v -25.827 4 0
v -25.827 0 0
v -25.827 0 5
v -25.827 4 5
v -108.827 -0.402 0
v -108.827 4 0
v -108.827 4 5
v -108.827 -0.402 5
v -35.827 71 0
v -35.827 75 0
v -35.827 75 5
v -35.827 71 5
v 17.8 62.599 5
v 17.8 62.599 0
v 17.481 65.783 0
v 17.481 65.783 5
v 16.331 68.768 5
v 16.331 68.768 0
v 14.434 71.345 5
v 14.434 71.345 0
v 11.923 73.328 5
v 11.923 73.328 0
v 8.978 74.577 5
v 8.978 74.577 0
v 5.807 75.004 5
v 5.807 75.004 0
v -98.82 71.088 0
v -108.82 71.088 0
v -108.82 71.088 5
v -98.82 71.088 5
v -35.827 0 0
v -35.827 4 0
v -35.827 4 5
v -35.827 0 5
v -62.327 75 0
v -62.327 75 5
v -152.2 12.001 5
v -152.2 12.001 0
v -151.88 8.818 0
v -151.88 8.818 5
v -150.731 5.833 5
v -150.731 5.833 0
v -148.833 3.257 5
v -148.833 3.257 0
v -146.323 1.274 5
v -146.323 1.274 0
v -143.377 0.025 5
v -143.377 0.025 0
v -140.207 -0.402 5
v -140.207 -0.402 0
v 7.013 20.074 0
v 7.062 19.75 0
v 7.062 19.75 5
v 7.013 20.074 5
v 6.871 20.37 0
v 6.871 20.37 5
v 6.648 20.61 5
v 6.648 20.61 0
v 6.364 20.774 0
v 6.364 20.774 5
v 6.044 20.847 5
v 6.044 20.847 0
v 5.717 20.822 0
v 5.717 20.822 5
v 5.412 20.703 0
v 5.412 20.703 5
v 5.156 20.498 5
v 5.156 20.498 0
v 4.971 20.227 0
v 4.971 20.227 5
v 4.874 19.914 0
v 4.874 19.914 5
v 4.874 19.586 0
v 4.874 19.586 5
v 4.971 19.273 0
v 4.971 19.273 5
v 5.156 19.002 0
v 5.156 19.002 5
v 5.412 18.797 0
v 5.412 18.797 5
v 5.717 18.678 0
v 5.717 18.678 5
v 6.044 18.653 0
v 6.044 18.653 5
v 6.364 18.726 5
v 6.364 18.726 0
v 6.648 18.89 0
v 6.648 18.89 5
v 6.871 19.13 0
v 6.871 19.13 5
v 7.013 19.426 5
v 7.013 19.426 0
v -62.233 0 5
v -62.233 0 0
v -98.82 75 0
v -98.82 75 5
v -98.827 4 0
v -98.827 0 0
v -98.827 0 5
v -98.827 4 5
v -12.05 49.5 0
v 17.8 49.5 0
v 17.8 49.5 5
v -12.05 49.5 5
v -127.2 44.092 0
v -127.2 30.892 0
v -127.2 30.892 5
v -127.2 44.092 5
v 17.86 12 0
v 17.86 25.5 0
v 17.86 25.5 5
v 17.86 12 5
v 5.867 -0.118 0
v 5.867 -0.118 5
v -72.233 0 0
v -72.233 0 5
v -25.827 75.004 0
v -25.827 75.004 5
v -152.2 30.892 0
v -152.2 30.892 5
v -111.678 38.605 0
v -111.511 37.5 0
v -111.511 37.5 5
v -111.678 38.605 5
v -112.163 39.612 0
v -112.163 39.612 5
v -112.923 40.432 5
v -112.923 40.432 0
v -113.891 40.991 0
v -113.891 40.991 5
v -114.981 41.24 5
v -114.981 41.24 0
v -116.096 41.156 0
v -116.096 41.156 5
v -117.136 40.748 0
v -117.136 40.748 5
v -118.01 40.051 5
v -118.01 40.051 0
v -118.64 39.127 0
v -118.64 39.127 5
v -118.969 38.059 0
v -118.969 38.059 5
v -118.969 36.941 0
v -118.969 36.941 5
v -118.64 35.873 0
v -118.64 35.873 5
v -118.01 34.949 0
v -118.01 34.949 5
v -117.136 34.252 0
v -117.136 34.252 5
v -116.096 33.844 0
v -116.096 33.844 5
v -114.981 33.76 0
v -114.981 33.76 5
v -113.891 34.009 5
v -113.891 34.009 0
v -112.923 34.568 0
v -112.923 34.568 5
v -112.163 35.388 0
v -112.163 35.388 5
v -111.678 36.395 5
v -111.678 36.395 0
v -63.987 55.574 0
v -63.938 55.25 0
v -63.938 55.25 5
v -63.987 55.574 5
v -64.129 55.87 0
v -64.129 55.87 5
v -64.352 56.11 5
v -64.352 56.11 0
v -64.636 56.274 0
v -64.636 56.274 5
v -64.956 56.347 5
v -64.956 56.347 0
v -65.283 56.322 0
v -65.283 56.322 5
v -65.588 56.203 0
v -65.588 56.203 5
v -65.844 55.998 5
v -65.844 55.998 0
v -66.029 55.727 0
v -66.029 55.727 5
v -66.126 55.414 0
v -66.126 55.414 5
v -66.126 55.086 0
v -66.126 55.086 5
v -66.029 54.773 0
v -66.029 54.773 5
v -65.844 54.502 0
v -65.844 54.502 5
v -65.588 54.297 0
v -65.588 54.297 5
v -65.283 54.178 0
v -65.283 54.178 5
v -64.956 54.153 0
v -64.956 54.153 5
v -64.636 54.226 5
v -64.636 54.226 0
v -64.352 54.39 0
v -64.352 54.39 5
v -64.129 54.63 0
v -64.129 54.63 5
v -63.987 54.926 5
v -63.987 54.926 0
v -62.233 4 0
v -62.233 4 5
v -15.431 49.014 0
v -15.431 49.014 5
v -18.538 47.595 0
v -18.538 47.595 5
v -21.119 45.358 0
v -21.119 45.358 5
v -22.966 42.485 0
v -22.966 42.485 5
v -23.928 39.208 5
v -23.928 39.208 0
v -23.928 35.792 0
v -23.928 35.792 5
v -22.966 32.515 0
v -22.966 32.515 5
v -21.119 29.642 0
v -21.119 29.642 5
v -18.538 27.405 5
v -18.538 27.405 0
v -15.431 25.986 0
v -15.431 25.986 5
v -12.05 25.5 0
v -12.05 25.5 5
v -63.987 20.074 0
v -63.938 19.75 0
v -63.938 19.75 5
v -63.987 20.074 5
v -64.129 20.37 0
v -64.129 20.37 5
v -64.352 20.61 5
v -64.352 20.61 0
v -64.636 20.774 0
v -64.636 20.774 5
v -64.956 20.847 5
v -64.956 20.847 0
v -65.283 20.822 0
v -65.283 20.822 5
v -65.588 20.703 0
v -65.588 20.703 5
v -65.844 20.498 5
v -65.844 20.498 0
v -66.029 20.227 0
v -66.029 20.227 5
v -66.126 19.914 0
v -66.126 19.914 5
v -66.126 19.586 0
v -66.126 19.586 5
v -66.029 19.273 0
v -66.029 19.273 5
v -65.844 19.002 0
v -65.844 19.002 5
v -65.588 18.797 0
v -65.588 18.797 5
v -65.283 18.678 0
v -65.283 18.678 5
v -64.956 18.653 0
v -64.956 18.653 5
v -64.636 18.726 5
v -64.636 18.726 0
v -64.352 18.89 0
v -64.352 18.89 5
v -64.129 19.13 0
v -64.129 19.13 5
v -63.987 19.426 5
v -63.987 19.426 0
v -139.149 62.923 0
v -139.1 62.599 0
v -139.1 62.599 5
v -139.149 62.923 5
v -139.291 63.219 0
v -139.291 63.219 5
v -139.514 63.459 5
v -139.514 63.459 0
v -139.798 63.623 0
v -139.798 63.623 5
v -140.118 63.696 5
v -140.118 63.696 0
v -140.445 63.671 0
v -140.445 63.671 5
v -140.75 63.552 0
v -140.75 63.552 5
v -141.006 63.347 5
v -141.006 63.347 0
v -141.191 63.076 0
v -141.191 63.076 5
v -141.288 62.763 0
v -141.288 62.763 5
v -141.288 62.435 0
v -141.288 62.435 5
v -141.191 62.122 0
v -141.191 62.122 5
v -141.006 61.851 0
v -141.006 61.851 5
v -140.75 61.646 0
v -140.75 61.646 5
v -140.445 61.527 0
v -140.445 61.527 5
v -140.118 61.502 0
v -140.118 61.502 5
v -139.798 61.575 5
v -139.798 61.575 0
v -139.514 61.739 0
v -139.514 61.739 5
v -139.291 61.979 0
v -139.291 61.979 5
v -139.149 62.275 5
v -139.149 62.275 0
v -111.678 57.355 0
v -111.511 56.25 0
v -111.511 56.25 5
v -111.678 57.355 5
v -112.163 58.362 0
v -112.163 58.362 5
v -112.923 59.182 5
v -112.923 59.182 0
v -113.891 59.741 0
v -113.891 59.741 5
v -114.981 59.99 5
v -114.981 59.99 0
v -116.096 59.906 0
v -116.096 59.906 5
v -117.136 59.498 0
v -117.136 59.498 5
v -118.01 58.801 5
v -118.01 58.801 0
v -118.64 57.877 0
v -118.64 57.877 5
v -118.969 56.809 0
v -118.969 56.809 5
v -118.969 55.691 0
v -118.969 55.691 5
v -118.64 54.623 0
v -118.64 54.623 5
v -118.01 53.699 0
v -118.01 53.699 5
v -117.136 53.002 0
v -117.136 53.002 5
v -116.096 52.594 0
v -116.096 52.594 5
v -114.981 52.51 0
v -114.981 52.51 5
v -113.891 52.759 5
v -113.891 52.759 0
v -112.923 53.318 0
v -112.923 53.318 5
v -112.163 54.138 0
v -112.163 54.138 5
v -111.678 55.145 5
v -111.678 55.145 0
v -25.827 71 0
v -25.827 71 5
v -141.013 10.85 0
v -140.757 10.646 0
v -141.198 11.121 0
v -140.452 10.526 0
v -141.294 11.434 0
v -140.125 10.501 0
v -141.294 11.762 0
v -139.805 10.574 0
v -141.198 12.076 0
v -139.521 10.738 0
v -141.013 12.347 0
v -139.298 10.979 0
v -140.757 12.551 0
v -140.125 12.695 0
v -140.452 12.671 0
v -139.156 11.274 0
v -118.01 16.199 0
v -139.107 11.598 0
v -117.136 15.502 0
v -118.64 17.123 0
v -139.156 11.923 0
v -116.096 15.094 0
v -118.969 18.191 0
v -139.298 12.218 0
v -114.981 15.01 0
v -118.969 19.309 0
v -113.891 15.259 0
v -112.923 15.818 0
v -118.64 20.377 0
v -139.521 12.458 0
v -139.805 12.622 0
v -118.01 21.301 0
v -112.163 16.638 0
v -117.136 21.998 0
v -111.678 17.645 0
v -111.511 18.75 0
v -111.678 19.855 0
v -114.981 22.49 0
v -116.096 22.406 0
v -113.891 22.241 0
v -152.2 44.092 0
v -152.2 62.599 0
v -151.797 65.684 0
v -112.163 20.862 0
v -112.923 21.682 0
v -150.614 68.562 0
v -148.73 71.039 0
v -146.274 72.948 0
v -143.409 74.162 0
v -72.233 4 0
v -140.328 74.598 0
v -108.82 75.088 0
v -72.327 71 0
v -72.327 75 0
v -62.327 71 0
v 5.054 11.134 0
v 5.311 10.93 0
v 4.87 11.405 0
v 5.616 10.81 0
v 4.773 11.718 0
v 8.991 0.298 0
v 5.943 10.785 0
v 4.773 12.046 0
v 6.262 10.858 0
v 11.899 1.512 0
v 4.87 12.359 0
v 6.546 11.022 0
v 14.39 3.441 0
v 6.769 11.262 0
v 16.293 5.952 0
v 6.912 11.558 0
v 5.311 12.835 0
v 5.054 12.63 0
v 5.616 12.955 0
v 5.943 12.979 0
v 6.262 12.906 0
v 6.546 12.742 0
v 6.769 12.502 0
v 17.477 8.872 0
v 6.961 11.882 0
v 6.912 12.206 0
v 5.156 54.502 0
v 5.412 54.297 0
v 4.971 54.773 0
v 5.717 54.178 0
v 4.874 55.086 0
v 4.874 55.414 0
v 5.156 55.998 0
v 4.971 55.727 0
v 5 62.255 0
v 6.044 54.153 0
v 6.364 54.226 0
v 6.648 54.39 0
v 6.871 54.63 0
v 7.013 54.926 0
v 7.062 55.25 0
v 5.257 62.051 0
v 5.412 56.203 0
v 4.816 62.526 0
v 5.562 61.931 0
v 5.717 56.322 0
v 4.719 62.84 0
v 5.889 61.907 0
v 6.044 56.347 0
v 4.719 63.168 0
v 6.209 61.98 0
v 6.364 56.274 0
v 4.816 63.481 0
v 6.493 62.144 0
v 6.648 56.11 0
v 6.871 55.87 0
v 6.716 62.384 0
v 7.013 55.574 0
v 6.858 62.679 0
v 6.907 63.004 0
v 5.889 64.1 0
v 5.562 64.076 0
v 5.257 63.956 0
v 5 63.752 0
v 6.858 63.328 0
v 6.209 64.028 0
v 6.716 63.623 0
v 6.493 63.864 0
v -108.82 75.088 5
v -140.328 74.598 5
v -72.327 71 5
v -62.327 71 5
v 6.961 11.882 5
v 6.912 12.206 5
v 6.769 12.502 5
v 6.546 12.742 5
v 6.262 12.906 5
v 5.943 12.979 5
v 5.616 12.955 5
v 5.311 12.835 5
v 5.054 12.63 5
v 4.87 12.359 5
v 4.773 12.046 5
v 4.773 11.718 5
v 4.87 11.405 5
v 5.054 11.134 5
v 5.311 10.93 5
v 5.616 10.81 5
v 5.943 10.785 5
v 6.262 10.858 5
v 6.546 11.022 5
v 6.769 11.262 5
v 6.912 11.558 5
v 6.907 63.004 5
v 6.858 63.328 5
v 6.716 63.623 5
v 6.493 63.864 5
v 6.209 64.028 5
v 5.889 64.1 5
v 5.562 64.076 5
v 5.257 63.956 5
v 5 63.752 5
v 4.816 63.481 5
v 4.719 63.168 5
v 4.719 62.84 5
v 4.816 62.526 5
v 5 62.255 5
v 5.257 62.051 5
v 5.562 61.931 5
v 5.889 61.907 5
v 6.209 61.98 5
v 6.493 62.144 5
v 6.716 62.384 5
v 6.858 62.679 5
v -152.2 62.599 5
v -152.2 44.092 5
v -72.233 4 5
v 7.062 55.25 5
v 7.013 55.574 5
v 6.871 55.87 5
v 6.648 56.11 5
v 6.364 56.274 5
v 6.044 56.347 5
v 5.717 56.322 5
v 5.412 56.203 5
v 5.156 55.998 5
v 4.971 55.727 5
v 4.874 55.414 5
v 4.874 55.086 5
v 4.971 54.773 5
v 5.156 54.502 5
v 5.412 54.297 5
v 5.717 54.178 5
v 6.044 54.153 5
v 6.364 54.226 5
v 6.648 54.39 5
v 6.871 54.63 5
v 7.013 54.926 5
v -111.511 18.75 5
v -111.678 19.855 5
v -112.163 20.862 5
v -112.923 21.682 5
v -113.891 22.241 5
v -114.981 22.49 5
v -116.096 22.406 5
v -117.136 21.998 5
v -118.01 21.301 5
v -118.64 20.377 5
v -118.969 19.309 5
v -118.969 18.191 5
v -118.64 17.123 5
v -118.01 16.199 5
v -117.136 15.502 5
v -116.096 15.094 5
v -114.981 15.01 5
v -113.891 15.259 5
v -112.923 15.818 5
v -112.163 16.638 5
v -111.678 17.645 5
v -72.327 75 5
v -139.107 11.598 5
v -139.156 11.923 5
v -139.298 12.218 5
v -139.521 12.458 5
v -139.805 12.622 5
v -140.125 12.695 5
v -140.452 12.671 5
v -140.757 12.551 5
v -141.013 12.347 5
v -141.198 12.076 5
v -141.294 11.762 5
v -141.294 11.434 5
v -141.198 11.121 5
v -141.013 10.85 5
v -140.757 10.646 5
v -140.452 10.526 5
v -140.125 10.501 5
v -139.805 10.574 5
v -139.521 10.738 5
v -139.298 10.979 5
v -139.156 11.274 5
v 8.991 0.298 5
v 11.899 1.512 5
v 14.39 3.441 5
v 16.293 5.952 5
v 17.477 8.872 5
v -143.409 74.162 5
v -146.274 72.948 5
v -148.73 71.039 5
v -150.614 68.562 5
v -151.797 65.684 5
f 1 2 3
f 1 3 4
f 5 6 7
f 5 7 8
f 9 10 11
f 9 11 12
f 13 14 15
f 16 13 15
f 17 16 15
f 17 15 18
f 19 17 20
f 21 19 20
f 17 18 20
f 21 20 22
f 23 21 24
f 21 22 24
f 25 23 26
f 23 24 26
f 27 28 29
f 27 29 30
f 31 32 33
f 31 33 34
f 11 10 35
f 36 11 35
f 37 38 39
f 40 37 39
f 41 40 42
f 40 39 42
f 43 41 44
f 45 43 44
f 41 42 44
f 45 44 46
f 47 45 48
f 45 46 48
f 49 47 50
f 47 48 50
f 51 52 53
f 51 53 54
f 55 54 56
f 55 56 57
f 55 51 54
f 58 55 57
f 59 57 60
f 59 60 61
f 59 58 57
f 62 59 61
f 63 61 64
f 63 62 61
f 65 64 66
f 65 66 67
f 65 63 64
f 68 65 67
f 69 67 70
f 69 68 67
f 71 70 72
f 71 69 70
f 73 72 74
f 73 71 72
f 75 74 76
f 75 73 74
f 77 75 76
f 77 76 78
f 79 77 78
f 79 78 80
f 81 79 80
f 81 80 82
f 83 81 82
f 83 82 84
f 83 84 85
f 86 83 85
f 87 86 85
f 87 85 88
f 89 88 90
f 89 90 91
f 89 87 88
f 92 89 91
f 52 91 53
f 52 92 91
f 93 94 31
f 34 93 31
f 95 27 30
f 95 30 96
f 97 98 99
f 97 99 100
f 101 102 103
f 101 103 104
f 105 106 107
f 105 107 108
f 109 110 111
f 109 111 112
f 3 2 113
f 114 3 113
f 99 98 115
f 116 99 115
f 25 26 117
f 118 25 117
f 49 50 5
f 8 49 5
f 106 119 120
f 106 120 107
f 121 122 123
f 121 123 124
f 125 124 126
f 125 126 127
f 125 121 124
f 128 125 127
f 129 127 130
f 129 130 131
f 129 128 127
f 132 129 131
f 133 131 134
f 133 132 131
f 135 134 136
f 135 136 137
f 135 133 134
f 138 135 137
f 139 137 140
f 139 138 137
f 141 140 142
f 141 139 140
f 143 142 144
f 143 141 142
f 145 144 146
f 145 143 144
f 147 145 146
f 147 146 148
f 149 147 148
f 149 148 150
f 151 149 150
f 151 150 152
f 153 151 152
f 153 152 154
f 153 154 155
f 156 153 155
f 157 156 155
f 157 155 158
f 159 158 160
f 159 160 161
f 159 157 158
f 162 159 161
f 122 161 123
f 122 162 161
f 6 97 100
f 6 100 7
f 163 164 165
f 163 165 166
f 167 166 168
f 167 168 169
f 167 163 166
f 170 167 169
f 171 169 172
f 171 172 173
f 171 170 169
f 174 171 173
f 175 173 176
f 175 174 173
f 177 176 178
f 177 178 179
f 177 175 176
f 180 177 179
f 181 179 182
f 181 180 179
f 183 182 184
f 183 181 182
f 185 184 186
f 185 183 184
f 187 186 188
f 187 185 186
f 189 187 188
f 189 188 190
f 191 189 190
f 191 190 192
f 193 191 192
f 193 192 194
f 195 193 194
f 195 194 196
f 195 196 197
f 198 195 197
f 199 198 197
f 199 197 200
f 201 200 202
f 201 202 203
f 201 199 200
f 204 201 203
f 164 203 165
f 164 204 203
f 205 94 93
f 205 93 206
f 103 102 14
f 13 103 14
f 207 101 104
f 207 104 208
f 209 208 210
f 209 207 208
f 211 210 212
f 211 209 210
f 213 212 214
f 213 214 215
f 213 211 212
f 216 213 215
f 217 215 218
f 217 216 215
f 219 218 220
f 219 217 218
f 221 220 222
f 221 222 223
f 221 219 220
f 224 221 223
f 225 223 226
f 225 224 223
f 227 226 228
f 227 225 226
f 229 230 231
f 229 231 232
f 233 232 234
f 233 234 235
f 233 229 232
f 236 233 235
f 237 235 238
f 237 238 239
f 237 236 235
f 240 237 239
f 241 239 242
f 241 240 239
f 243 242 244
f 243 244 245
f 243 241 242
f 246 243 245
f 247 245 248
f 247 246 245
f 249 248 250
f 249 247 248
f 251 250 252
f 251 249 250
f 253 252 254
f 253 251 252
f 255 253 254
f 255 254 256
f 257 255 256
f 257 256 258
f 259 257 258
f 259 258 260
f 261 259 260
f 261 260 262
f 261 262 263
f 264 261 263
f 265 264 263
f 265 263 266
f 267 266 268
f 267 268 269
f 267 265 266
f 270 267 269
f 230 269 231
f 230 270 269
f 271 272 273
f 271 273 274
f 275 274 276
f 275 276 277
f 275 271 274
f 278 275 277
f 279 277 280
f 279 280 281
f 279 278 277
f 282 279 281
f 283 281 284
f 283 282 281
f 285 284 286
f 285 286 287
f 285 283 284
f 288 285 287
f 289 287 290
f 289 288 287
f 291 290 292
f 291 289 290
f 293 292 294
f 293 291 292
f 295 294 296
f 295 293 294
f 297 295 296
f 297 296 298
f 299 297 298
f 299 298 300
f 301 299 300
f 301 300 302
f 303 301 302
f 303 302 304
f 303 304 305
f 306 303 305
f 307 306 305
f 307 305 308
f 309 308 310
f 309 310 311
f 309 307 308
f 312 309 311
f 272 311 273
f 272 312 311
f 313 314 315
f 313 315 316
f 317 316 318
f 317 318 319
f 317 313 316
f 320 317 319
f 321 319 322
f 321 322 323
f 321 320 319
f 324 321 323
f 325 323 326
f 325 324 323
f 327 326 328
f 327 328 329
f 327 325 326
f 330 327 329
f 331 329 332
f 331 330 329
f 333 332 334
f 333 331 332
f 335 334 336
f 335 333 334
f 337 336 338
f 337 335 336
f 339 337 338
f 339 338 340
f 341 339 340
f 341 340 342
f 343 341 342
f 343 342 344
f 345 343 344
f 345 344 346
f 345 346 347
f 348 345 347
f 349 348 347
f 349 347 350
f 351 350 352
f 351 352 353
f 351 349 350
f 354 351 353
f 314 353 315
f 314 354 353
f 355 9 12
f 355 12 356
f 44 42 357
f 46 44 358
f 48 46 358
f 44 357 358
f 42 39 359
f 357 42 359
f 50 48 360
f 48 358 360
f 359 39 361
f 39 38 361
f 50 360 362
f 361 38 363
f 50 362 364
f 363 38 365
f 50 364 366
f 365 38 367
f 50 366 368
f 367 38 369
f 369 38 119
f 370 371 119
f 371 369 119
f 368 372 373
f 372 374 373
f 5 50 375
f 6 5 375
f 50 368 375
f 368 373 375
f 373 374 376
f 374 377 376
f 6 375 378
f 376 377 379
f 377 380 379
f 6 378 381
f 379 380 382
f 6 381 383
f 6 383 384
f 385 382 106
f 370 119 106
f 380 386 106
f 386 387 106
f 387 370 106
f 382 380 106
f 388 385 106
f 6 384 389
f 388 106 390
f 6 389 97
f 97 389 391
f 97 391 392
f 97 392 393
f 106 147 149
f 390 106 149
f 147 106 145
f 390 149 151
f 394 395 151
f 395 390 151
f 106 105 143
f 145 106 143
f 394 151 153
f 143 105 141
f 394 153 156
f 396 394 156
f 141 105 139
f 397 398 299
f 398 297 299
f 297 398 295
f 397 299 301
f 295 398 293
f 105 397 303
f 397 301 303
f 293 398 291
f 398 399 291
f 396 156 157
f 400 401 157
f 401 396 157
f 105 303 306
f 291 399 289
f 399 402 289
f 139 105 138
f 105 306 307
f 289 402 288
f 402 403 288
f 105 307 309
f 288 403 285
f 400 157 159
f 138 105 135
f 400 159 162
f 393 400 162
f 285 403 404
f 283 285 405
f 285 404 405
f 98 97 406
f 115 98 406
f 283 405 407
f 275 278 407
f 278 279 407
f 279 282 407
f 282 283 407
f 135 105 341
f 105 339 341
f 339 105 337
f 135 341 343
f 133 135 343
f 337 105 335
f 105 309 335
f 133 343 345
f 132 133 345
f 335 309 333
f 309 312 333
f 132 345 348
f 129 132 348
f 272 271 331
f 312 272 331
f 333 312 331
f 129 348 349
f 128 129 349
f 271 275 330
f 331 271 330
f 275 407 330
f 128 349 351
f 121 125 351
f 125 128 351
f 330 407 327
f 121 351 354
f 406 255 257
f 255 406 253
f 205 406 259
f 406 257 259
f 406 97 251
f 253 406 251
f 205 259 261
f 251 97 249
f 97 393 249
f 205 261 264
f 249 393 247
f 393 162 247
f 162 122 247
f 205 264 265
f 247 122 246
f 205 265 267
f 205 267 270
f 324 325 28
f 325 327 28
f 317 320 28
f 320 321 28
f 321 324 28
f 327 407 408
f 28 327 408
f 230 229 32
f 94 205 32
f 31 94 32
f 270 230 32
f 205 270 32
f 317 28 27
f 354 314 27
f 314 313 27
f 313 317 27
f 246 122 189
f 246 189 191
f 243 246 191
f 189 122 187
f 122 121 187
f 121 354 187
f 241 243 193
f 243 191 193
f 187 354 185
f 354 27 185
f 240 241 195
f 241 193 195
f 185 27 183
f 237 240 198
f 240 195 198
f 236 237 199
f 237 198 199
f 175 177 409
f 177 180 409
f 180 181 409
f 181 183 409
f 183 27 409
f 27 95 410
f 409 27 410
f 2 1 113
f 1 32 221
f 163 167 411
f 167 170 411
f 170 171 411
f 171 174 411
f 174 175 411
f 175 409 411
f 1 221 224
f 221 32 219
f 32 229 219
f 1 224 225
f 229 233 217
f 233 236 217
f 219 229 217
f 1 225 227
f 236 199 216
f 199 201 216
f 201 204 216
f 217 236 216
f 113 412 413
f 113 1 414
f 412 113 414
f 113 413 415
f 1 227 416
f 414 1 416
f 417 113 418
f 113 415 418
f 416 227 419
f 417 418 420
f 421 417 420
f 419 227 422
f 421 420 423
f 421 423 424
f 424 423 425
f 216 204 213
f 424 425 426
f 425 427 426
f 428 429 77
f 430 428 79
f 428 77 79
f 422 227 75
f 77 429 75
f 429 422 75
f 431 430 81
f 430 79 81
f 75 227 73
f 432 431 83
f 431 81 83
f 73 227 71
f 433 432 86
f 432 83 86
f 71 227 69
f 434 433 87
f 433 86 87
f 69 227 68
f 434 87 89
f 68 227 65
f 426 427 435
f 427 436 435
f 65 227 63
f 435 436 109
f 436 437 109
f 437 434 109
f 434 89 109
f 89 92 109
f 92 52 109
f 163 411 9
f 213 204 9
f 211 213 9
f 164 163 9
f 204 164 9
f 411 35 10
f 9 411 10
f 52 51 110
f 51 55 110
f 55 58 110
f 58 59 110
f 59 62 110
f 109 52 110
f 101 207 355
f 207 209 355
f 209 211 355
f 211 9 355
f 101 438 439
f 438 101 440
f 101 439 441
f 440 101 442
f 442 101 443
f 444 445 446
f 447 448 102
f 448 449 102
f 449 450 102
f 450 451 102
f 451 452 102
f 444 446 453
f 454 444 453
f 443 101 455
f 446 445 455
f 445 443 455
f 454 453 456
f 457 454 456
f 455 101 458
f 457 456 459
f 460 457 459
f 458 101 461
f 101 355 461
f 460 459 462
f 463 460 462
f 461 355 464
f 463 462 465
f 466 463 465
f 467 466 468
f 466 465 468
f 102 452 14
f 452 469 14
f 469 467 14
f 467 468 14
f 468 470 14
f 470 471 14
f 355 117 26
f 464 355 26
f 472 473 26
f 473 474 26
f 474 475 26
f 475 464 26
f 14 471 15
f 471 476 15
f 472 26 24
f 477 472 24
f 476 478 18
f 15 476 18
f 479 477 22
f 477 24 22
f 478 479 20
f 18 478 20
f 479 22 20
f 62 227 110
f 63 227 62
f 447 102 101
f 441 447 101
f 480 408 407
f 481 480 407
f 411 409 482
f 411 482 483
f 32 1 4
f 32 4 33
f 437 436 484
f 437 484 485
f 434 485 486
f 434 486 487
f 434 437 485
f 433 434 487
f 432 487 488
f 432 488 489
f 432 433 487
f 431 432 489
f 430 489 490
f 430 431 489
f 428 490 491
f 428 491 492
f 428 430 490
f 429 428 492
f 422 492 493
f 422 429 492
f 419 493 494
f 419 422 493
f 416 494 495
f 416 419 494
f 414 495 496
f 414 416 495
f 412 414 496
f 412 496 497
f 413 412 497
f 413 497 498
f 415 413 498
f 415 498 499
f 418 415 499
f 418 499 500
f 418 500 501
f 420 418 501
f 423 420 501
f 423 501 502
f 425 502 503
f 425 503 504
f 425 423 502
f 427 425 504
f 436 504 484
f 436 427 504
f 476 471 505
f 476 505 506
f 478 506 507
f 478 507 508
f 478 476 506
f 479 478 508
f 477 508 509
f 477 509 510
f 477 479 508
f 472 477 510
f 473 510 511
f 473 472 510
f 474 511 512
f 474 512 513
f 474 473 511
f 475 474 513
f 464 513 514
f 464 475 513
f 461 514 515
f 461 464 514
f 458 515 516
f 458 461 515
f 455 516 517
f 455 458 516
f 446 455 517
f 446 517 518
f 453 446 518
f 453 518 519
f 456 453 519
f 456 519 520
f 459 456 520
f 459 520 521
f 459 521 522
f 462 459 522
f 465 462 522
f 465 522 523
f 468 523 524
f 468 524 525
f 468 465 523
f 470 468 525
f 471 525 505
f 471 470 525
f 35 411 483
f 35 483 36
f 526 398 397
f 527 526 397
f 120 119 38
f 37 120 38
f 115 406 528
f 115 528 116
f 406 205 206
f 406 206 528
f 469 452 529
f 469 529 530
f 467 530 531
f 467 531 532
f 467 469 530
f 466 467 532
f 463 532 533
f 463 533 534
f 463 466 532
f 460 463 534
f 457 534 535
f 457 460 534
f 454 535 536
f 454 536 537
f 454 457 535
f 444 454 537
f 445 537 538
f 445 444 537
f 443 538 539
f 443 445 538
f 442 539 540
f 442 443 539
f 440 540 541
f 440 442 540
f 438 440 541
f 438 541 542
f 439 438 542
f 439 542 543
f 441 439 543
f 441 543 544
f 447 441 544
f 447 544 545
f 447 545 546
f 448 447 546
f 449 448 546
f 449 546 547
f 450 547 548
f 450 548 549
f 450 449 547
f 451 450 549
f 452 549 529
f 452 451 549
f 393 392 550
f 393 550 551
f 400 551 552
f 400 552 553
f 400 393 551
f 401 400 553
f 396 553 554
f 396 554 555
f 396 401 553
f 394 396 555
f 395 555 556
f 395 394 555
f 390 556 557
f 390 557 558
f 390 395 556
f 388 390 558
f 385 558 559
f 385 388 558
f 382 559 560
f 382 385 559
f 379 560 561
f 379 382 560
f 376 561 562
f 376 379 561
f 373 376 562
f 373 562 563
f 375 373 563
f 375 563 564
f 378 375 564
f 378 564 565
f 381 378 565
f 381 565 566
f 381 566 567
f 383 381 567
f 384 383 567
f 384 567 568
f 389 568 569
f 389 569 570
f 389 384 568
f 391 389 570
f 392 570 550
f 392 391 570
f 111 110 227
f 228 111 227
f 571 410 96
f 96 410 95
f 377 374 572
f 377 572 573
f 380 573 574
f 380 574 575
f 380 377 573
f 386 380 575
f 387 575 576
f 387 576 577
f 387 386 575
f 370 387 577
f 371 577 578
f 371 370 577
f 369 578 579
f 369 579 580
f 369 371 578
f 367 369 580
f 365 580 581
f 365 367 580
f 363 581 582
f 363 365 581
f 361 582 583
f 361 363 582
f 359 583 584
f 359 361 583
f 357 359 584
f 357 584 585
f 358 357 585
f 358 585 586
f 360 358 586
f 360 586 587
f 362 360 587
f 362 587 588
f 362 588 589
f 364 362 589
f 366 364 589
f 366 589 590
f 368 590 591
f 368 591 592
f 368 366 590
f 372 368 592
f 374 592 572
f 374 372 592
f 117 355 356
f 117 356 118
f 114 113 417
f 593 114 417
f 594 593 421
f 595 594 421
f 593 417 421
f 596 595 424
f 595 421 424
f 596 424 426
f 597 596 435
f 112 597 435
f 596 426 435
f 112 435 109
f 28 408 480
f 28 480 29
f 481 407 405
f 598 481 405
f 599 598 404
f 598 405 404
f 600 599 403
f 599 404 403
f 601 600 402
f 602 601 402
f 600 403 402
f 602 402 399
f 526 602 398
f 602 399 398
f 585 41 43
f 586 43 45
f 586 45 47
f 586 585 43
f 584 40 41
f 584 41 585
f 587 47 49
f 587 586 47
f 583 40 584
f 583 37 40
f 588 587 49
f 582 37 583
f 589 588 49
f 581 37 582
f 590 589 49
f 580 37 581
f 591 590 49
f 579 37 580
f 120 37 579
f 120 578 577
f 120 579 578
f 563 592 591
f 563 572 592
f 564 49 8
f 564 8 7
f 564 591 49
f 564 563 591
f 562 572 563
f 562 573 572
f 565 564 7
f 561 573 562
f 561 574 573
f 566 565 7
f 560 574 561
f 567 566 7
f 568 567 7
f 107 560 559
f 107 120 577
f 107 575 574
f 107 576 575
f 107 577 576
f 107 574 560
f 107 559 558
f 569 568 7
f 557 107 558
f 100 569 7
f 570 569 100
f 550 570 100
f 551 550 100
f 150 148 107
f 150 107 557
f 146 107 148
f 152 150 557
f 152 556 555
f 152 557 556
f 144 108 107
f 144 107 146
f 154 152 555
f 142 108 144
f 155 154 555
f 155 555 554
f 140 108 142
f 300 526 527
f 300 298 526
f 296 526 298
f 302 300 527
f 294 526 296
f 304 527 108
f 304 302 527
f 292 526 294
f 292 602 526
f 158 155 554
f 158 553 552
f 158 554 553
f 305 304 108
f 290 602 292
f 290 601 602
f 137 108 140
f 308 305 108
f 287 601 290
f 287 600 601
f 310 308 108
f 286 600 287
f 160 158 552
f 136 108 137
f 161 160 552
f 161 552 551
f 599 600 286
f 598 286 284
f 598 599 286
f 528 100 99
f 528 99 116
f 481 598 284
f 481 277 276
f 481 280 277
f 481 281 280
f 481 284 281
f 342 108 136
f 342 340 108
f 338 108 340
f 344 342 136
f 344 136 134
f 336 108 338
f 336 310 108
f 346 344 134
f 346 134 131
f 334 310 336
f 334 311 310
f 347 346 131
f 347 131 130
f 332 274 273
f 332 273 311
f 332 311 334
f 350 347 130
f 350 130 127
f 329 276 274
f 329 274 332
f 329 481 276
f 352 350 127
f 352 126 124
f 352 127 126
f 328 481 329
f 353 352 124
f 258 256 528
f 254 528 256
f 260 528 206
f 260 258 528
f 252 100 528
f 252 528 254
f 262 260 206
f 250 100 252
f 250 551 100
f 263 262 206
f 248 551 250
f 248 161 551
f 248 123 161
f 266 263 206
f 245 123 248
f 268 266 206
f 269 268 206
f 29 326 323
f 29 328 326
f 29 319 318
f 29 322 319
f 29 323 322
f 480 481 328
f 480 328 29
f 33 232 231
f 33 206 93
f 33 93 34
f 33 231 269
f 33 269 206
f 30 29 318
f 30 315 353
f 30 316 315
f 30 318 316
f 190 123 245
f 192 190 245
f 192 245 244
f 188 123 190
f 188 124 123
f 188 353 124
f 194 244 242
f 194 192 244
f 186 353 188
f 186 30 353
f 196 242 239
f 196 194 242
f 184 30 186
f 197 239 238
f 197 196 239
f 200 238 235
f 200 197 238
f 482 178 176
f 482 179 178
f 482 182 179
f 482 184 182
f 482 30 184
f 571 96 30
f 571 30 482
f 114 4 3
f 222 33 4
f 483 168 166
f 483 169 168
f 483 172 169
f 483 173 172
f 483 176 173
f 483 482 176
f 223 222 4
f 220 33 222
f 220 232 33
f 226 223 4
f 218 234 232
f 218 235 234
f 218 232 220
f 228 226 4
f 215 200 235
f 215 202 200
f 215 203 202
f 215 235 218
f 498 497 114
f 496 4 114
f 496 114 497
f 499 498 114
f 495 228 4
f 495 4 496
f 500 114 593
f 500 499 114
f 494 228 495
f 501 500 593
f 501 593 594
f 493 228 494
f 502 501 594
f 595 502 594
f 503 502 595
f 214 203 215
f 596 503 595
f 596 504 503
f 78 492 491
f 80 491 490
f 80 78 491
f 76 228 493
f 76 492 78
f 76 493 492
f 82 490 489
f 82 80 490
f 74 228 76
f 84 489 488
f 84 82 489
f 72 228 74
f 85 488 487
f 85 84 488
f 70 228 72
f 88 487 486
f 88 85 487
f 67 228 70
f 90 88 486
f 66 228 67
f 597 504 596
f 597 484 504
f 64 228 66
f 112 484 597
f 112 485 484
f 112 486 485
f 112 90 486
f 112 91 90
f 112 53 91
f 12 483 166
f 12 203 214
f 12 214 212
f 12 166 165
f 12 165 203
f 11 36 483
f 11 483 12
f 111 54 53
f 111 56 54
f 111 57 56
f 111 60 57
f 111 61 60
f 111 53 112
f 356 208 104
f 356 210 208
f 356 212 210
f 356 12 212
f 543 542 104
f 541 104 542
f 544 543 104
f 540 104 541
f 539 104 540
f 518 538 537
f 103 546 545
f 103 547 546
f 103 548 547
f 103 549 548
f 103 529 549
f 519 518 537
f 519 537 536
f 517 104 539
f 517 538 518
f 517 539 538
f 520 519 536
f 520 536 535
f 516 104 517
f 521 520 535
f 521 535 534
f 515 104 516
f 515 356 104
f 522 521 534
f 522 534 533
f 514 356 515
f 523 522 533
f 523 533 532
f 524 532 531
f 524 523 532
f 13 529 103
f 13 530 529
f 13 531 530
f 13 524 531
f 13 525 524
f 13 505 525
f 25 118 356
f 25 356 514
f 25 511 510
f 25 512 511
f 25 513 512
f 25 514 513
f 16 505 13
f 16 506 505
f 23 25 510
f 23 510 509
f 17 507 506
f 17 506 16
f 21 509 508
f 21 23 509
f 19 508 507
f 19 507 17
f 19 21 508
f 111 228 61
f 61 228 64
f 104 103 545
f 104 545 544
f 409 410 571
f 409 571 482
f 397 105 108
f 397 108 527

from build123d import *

# Parameters (mm, degrees)
SKETCH_R   = 1.1
SKETCH_R_2 = 3.75
PAD_DEPTH  = 5


with BuildPart() as part:
    # Sketch → Pad (new body)
    with BuildSketch(Plane.XY):
        with BuildLine():
            Line((-152.2, 62.598999), (-152.2, 44.092341))
            Line((-127.2, 44.092341), (-152.2, 44.092341))
            Line((-127.2, 30.892341), (-127.2, 44.092341))
            Line((-152.2, 30.892341), (-127.2, 30.892341))
            Line((-152.2, 30.892341), (-152.2, 12.001349))
            ThreePointArc((-152.2, 12.001349), (-148.833331, 3.256809), (-140.206767, -0.401585))
            Line((-140.206767, -0.401585), (-108.826601, -0.401585))
            Line((-108.826601, 4), (-108.826601, -0.401585))
            Line((-98.826601, 4), (-108.826601, 4))
            Line((-98.826601, 0), (-98.826601, 4))
            Line((-98.826601, 0), (-72.233324, 0))
            Line((-72.233324, 4), (-72.233324, 0))
            Line((-62.233324, 4), (-72.233324, 4))
            Line((-62.233324, 0), (-62.233324, 4))
            Line((-62.233324, 0), (-35.826601, 0))
            Line((-35.826601, 4), (-35.826601, 0))
            Line((-25.826601, 4), (-35.826601, 4))
            Line((-25.826601, 0), (-25.826601, 4))
            Line((-25.826601, 0), (5.867454, -0.117862))
            ThreePointArc((5.867454, -0.117862), (14.389845, 3.441069), (17.86, 11.999991))
            Line((17.86, 25.499993), (17.86, 11.999991))
            Line((17.86, 25.499993), (-12.05, 25.499993))
            ThreePointArc((-12.050007, 49.499989), (-24.049998, 37.499988), (-12.05, 25.499993))
            Line((17.8, 49.500007), (-12.050007, 49.499989))
            Line((17.8, 49.500007), (17.8, 62.599011))
            ThreePointArc((17.8, 62.599011), (14.433945, 71.344583), (5.806821, 75.003556))
            Line((5.806821, 75.003556), (-25.826601, 75.003556))
            Line((-25.826601, 71), (-25.826601, 75.003556))
            Line((-35.826601, 71), (-25.826601, 71))
            Line((-35.826601, 75), (-35.826601, 71))
            Line((-35.826601, 75), (-62.326601, 75))
            Line((-62.326601, 71), (-62.326601, 75))
            Line((-72.326601, 71), (-62.326601, 71))
            Line((-72.326601, 75), (-72.326601, 71))
            Line((-72.326601, 75), (-98.82, 75))
            Line((-98.82, 71.087749), (-98.82, 75))
            Line((-108.82, 71.087749), (-98.82, 71.087749))
            Line((-108.82, 75.087749), (-108.82, 71.087749))
            Line((-108.82, 75.087749), (-140.32794, 74.598317))
            ThreePointArc((-140.32794, 74.598317), (-148.730395, 71.038925), (-152.2, 62.598999))
        make_face()
        with Locations((5.962192, 55.25)):
            Circle(SKETCH_R, mode=Mode.SUBTRACT)
        with Locations((-65.037808, 55.25)):
            Circle(SKETCH_R, mode=Mode.SUBTRACT)
        with Locations((-65.037808, 19.75)):
            Circle(SKETCH_R, mode=Mode.SUBTRACT)
        with Locations((5.962192, 19.75)):
            Circle(SKETCH_R, mode=Mode.SUBTRACT)
        with Locations((-140.2, 62.598999)):
            Circle(SKETCH_R, mode=Mode.SUBTRACT)
        with Locations((-140.206767, 11.598415)):
            Circle(SKETCH_R, mode=Mode.SUBTRACT)
        with Locations((5.860579, 11.882136)):
            Circle(SKETCH_R, mode=Mode.SUBTRACT)
        with Locations((5.806821, 63.003556)):
            Circle(SKETCH_R, mode=Mode.SUBTRACT)
        with Locations((-115.261171, 37.5)):
            Circle(SKETCH_R_2, mode=Mode.SUBTRACT)
        with Locations((-115.261171, 56.25)):
            Circle(SKETCH_R_2, mode=Mode.SUBTRACT)
        with Locations((-115.261171, 18.75)):
            Circle(SKETCH_R_2, mode=Mode.SUBTRACT)
    extrude(amount=PAD_DEPTH)


solid = part.part
